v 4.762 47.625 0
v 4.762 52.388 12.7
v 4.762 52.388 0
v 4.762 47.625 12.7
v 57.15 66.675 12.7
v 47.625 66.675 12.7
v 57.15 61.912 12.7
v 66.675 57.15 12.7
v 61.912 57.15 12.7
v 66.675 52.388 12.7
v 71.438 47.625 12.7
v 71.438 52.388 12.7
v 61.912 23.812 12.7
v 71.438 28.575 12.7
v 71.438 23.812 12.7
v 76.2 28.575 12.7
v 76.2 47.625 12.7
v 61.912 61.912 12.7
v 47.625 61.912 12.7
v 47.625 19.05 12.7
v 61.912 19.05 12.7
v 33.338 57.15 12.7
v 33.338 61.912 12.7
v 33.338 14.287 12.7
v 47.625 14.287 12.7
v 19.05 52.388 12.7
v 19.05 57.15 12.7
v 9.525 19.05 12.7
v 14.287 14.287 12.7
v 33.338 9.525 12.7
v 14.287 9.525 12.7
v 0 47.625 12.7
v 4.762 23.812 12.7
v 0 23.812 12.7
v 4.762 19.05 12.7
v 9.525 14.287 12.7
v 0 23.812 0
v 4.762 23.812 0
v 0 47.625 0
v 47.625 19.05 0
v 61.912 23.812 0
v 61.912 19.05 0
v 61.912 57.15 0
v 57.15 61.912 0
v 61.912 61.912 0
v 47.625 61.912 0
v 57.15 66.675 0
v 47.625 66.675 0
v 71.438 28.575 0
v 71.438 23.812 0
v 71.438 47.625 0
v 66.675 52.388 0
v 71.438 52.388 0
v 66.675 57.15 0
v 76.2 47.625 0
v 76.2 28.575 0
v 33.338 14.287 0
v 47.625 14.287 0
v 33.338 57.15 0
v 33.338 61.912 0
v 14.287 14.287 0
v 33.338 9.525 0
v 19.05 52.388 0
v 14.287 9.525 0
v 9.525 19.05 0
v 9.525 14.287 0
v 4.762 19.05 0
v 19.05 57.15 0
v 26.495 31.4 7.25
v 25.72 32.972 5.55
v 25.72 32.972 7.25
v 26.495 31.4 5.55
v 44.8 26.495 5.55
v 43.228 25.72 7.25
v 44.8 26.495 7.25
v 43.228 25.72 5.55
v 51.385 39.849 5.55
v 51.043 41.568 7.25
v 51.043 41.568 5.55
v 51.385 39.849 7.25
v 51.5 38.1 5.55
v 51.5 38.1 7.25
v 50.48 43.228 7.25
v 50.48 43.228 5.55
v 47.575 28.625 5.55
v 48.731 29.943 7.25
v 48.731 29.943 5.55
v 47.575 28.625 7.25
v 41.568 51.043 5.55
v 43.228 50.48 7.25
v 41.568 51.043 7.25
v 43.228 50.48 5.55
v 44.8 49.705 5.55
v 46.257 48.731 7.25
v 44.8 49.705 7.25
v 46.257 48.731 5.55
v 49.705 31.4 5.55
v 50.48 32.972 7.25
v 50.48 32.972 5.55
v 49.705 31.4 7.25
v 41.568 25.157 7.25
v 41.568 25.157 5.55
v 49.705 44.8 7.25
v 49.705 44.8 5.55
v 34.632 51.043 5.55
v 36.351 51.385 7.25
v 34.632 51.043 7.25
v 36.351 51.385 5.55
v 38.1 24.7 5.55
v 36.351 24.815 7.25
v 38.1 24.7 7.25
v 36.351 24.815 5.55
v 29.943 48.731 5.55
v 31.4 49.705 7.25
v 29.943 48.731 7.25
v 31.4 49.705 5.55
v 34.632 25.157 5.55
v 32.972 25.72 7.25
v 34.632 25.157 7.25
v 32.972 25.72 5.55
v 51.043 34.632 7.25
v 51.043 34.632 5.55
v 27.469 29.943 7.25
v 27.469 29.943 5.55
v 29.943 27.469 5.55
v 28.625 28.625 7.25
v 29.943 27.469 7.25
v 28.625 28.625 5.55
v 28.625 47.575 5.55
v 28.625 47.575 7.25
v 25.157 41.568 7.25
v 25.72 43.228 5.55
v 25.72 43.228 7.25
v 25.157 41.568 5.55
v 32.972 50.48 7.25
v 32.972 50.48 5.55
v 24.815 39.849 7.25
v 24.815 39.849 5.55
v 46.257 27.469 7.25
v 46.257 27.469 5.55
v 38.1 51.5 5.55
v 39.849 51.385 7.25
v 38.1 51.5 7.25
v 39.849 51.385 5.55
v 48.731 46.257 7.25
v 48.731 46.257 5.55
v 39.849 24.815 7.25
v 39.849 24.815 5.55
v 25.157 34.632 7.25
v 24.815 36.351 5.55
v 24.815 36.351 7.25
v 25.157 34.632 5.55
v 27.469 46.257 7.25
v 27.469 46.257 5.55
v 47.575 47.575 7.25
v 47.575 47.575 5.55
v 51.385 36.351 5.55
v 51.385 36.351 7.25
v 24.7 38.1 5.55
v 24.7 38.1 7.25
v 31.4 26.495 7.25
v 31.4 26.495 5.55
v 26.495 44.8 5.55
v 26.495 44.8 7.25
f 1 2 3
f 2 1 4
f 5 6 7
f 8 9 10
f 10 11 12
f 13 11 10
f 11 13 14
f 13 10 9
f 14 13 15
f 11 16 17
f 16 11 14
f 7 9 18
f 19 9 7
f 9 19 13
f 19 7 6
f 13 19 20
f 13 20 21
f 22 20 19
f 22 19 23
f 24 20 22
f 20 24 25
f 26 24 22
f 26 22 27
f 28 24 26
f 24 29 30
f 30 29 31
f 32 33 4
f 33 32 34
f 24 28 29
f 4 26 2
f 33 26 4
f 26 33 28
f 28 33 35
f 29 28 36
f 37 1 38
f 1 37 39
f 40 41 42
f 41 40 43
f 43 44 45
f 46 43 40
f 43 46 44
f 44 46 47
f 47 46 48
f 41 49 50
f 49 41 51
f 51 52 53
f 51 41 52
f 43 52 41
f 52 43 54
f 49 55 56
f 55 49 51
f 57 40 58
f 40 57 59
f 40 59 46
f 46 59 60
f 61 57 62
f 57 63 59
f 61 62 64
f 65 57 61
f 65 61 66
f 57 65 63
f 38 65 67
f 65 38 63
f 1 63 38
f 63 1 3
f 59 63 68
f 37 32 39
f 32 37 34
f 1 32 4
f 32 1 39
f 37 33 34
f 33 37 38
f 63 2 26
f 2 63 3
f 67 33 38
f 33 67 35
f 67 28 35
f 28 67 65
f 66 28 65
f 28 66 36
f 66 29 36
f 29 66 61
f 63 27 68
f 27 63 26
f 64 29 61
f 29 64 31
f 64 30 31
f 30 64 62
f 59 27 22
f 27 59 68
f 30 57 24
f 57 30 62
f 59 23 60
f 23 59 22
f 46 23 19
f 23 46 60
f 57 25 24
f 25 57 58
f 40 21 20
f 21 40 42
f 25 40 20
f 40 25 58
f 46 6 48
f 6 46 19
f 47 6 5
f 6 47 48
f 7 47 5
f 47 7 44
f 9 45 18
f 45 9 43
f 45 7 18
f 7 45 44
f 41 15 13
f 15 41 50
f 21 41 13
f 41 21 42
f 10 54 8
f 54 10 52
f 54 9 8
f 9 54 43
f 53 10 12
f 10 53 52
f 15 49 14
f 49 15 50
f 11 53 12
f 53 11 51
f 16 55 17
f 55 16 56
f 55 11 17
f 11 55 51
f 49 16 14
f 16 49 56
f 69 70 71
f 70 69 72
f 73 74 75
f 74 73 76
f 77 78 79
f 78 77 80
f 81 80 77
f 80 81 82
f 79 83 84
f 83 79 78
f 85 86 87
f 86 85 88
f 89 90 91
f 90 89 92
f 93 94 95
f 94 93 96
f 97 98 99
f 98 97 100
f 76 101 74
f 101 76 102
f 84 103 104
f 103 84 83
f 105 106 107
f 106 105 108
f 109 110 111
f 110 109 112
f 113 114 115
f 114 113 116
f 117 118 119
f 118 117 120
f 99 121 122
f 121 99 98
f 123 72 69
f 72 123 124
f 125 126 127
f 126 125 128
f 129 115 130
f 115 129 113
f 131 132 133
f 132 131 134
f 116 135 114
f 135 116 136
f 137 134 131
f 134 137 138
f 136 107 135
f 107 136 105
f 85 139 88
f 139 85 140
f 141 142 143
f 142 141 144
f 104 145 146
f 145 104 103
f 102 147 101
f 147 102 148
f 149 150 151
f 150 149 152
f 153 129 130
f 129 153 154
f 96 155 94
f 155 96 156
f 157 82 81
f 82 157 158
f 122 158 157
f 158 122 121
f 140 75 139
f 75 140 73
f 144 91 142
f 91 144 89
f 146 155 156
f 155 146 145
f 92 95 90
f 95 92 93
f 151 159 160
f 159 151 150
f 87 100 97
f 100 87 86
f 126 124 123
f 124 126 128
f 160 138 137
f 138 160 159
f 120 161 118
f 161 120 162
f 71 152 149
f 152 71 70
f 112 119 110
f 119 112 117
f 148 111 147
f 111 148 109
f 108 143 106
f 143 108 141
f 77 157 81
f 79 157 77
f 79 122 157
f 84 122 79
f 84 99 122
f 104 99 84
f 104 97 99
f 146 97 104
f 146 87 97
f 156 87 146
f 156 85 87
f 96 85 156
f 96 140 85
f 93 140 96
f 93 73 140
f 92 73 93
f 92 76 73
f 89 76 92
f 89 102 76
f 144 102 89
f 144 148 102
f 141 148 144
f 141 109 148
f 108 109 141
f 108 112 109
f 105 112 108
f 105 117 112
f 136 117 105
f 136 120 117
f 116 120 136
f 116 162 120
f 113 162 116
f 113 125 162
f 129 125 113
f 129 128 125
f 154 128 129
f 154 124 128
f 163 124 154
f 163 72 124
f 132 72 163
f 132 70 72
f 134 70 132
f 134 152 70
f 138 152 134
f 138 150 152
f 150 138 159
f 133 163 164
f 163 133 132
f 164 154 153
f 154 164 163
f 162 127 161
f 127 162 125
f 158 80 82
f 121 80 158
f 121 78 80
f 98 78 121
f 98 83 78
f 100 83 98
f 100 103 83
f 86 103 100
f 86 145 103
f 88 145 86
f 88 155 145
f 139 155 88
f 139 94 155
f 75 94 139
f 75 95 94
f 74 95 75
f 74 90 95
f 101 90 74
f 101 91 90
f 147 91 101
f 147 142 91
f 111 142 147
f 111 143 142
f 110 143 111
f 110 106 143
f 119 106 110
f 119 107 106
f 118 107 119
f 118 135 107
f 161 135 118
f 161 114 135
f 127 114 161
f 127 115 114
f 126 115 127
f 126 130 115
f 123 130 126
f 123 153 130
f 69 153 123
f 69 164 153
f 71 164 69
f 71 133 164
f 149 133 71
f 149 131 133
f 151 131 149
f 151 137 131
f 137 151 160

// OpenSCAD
// gold_ingot — Minecraft Item Shape 3D Model
// Auto-generated from minecraft/textures/item/gold_ingot.png
//
// Open in OpenSCAD → F5 preview → F6 render → F7 export STL

// ============================================================
// PARAMETERS
// ============================================================

GRID_SIZE_IN    = 3.0;           // crafting table slot size
PIXELS          = 16;              // grid divisions (shape-fitted)
PIXEL_MM        = (GRID_SIZE_IN * 25.4) / PIXELS;  // mm per pixel

DEPTH_IN        = 0.5;          // extrusion depth in inches
DEPTH_MM        = DEPTH_IN * 25.4;

// NFC tag (NTAG215 25mm coin)
TAG_DIAMETER    = 26;           // mm — slightly oversized for easy drop-in
TAG_THICKNESS   = 1.2;         // mm
TAG_CLEARANCE   = 0.4;         // mm extra around tag

cavity_d = TAG_DIAMETER + TAG_CLEARANCE * 2;
cavity_h = TAG_THICKNESS + TAG_CLEARANCE;

echo(str("Tag cavity: ", cavity_d, "mm dia × ", cavity_h, "mm deep"));
echo(str("PAUSE AT: ", DEPTH_MM / 2 + cavity_h / 2, "mm to insert tag"));

module tag_cavity() {
    cx = (7.5 + 0.5) * PIXEL_MM;
    cy = (PIXELS - 1 - 7.5 + 0.5) * PIXEL_MM;
    translate([cx, cy, DEPTH_MM / 2 - cavity_h / 2])
        cylinder(d = cavity_d, h = cavity_h + 0.1, $fn = 48);
}

module tag_shelf() {
    cx = (7.5 + 0.5) * PIXEL_MM;
    cy = (PIXELS - 1 - 7.5 + 0.5) * PIXEL_MM;
    translate([cx, cy, DEPTH_MM / 2 - cavity_h / 2 - 1.0])
        cylinder(d = cavity_d + 4, h = 1.0, $fn = 48);
}

echo(str("Pixel size: ", PIXEL_MM, "mm"));
echo(str("Footprint: ", PIXELS * PIXEL_MM, "mm = ", GRID_SIZE_IN, " in"));
echo(str("Depth: ", DEPTH_MM, "mm = ", DEPTH_IN, " in"));

// ============================================================
// PIXEL MAP — 135 opaque pixels
// ============================================================

item_pixels = [
    [0.0,6.0], [0.0,7.0], [0.0,8.0], [0.0,9.0], [0.0,10.0], [1.0,5.0], [1.0,6.0], [1.0,7.0],
    [1.0,8.0], [1.0,9.0], [1.0,10.0], [1.0,11.0], [2.0,5.0], [2.0,6.0], [2.0,7.0], [2.0,8.0],
    [2.0,9.0], [2.0,10.0], [2.0,11.0], [2.0,12.0], [3.0,5.0], [3.0,6.0], [3.0,7.0], [3.0,8.0],
    [3.0,9.0], [3.0,10.0], [3.0,11.0], [3.0,12.0], [3.0,13.0], [4.0,4.0], [4.0,5.0], [4.0,6.0],
    [4.0,7.0], [4.0,8.0], [4.0,9.0], [4.0,10.0], [4.0,11.0], [4.0,12.0], [4.0,13.0], [5.0,4.0],
    [5.0,5.0], [5.0,6.0], [5.0,7.0], [5.0,8.0], [5.0,9.0], [5.0,10.0], [5.0,11.0], [5.0,12.0],
    [5.0,13.0], [6.0,4.0], [6.0,5.0], [6.0,6.0], [6.0,7.0], [6.0,8.0], [6.0,9.0], [6.0,10.0],
    [6.0,11.0], [6.0,12.0], [6.0,13.0], [7.0,3.0], [7.0,4.0], [7.0,5.0], [7.0,6.0], [7.0,7.0],
    [7.0,8.0], [7.0,9.0], [7.0,10.0], [7.0,11.0], [7.0,12.0], [8.0,3.0], [8.0,4.0], [8.0,5.0],
    [8.0,6.0], [8.0,7.0], [8.0,8.0], [8.0,9.0], [8.0,10.0], [8.0,11.0], [8.0,12.0], [9.0,3.0],
    [9.0,4.0], [9.0,5.0], [9.0,6.0], [9.0,7.0], [9.0,8.0], [9.0,9.0], [9.0,10.0], [9.0,11.0],
    [9.0,12.0], [10.0,2.0], [10.0,3.0], [10.0,4.0], [10.0,5.0], [10.0,6.0], [10.0,7.0], [10.0,8.0],
    [10.0,9.0], [10.0,10.0], [10.0,11.0], [11.0,2.0], [11.0,3.0], [11.0,4.0], [11.0,5.0], [11.0,6.0],
    [11.0,7.0], [11.0,8.0], [11.0,9.0], [11.0,10.0], [11.0,11.0], [12.0,3.0], [12.0,4.0], [12.0,5.0],
    [12.0,6.0], [12.0,7.0], [12.0,8.0], [12.0,9.0], [12.0,10.0], [12.0,11.0], [13.0,4.0], [13.0,5.0],
    [13.0,6.0], [13.0,7.0], [13.0,8.0], [13.0,9.0], [13.0,10.0], [14.0,5.0], [14.0,6.0], [14.0,7.0],
    [14.0,8.0], [14.0,9.0], [14.0,10.0], [15.0,6.0], [15.0,7.0], [15.0,8.0], [15.0,9.0]
];

// ============================================================
// MODULES
// ============================================================

module pixel_block(col, row) {
    translate([col * PIXEL_MM, (PIXELS - 1 - row) * PIXEL_MM, 0])
        cube([PIXEL_MM, PIXEL_MM, DEPTH_MM]);
}

module item_shape() {
    for (i = [0 : len(item_pixels) - 1])
        pixel_block(item_pixels[i][0], item_pixels[i][1]);
}

module item_final() {
    difference() {
        union() {
            item_shape();
            intersection() {
                item_shape();
                tag_shelf();
            }
        }
        tag_cavity();
    }
}

item_final();

// Cross-section view (uncomment to see tag cavity):
// difference() {
//     item_final();
//     translate([8 * PIXEL_MM + 50, 0, 0])
//         cube([100, 200, 100]);
// }
